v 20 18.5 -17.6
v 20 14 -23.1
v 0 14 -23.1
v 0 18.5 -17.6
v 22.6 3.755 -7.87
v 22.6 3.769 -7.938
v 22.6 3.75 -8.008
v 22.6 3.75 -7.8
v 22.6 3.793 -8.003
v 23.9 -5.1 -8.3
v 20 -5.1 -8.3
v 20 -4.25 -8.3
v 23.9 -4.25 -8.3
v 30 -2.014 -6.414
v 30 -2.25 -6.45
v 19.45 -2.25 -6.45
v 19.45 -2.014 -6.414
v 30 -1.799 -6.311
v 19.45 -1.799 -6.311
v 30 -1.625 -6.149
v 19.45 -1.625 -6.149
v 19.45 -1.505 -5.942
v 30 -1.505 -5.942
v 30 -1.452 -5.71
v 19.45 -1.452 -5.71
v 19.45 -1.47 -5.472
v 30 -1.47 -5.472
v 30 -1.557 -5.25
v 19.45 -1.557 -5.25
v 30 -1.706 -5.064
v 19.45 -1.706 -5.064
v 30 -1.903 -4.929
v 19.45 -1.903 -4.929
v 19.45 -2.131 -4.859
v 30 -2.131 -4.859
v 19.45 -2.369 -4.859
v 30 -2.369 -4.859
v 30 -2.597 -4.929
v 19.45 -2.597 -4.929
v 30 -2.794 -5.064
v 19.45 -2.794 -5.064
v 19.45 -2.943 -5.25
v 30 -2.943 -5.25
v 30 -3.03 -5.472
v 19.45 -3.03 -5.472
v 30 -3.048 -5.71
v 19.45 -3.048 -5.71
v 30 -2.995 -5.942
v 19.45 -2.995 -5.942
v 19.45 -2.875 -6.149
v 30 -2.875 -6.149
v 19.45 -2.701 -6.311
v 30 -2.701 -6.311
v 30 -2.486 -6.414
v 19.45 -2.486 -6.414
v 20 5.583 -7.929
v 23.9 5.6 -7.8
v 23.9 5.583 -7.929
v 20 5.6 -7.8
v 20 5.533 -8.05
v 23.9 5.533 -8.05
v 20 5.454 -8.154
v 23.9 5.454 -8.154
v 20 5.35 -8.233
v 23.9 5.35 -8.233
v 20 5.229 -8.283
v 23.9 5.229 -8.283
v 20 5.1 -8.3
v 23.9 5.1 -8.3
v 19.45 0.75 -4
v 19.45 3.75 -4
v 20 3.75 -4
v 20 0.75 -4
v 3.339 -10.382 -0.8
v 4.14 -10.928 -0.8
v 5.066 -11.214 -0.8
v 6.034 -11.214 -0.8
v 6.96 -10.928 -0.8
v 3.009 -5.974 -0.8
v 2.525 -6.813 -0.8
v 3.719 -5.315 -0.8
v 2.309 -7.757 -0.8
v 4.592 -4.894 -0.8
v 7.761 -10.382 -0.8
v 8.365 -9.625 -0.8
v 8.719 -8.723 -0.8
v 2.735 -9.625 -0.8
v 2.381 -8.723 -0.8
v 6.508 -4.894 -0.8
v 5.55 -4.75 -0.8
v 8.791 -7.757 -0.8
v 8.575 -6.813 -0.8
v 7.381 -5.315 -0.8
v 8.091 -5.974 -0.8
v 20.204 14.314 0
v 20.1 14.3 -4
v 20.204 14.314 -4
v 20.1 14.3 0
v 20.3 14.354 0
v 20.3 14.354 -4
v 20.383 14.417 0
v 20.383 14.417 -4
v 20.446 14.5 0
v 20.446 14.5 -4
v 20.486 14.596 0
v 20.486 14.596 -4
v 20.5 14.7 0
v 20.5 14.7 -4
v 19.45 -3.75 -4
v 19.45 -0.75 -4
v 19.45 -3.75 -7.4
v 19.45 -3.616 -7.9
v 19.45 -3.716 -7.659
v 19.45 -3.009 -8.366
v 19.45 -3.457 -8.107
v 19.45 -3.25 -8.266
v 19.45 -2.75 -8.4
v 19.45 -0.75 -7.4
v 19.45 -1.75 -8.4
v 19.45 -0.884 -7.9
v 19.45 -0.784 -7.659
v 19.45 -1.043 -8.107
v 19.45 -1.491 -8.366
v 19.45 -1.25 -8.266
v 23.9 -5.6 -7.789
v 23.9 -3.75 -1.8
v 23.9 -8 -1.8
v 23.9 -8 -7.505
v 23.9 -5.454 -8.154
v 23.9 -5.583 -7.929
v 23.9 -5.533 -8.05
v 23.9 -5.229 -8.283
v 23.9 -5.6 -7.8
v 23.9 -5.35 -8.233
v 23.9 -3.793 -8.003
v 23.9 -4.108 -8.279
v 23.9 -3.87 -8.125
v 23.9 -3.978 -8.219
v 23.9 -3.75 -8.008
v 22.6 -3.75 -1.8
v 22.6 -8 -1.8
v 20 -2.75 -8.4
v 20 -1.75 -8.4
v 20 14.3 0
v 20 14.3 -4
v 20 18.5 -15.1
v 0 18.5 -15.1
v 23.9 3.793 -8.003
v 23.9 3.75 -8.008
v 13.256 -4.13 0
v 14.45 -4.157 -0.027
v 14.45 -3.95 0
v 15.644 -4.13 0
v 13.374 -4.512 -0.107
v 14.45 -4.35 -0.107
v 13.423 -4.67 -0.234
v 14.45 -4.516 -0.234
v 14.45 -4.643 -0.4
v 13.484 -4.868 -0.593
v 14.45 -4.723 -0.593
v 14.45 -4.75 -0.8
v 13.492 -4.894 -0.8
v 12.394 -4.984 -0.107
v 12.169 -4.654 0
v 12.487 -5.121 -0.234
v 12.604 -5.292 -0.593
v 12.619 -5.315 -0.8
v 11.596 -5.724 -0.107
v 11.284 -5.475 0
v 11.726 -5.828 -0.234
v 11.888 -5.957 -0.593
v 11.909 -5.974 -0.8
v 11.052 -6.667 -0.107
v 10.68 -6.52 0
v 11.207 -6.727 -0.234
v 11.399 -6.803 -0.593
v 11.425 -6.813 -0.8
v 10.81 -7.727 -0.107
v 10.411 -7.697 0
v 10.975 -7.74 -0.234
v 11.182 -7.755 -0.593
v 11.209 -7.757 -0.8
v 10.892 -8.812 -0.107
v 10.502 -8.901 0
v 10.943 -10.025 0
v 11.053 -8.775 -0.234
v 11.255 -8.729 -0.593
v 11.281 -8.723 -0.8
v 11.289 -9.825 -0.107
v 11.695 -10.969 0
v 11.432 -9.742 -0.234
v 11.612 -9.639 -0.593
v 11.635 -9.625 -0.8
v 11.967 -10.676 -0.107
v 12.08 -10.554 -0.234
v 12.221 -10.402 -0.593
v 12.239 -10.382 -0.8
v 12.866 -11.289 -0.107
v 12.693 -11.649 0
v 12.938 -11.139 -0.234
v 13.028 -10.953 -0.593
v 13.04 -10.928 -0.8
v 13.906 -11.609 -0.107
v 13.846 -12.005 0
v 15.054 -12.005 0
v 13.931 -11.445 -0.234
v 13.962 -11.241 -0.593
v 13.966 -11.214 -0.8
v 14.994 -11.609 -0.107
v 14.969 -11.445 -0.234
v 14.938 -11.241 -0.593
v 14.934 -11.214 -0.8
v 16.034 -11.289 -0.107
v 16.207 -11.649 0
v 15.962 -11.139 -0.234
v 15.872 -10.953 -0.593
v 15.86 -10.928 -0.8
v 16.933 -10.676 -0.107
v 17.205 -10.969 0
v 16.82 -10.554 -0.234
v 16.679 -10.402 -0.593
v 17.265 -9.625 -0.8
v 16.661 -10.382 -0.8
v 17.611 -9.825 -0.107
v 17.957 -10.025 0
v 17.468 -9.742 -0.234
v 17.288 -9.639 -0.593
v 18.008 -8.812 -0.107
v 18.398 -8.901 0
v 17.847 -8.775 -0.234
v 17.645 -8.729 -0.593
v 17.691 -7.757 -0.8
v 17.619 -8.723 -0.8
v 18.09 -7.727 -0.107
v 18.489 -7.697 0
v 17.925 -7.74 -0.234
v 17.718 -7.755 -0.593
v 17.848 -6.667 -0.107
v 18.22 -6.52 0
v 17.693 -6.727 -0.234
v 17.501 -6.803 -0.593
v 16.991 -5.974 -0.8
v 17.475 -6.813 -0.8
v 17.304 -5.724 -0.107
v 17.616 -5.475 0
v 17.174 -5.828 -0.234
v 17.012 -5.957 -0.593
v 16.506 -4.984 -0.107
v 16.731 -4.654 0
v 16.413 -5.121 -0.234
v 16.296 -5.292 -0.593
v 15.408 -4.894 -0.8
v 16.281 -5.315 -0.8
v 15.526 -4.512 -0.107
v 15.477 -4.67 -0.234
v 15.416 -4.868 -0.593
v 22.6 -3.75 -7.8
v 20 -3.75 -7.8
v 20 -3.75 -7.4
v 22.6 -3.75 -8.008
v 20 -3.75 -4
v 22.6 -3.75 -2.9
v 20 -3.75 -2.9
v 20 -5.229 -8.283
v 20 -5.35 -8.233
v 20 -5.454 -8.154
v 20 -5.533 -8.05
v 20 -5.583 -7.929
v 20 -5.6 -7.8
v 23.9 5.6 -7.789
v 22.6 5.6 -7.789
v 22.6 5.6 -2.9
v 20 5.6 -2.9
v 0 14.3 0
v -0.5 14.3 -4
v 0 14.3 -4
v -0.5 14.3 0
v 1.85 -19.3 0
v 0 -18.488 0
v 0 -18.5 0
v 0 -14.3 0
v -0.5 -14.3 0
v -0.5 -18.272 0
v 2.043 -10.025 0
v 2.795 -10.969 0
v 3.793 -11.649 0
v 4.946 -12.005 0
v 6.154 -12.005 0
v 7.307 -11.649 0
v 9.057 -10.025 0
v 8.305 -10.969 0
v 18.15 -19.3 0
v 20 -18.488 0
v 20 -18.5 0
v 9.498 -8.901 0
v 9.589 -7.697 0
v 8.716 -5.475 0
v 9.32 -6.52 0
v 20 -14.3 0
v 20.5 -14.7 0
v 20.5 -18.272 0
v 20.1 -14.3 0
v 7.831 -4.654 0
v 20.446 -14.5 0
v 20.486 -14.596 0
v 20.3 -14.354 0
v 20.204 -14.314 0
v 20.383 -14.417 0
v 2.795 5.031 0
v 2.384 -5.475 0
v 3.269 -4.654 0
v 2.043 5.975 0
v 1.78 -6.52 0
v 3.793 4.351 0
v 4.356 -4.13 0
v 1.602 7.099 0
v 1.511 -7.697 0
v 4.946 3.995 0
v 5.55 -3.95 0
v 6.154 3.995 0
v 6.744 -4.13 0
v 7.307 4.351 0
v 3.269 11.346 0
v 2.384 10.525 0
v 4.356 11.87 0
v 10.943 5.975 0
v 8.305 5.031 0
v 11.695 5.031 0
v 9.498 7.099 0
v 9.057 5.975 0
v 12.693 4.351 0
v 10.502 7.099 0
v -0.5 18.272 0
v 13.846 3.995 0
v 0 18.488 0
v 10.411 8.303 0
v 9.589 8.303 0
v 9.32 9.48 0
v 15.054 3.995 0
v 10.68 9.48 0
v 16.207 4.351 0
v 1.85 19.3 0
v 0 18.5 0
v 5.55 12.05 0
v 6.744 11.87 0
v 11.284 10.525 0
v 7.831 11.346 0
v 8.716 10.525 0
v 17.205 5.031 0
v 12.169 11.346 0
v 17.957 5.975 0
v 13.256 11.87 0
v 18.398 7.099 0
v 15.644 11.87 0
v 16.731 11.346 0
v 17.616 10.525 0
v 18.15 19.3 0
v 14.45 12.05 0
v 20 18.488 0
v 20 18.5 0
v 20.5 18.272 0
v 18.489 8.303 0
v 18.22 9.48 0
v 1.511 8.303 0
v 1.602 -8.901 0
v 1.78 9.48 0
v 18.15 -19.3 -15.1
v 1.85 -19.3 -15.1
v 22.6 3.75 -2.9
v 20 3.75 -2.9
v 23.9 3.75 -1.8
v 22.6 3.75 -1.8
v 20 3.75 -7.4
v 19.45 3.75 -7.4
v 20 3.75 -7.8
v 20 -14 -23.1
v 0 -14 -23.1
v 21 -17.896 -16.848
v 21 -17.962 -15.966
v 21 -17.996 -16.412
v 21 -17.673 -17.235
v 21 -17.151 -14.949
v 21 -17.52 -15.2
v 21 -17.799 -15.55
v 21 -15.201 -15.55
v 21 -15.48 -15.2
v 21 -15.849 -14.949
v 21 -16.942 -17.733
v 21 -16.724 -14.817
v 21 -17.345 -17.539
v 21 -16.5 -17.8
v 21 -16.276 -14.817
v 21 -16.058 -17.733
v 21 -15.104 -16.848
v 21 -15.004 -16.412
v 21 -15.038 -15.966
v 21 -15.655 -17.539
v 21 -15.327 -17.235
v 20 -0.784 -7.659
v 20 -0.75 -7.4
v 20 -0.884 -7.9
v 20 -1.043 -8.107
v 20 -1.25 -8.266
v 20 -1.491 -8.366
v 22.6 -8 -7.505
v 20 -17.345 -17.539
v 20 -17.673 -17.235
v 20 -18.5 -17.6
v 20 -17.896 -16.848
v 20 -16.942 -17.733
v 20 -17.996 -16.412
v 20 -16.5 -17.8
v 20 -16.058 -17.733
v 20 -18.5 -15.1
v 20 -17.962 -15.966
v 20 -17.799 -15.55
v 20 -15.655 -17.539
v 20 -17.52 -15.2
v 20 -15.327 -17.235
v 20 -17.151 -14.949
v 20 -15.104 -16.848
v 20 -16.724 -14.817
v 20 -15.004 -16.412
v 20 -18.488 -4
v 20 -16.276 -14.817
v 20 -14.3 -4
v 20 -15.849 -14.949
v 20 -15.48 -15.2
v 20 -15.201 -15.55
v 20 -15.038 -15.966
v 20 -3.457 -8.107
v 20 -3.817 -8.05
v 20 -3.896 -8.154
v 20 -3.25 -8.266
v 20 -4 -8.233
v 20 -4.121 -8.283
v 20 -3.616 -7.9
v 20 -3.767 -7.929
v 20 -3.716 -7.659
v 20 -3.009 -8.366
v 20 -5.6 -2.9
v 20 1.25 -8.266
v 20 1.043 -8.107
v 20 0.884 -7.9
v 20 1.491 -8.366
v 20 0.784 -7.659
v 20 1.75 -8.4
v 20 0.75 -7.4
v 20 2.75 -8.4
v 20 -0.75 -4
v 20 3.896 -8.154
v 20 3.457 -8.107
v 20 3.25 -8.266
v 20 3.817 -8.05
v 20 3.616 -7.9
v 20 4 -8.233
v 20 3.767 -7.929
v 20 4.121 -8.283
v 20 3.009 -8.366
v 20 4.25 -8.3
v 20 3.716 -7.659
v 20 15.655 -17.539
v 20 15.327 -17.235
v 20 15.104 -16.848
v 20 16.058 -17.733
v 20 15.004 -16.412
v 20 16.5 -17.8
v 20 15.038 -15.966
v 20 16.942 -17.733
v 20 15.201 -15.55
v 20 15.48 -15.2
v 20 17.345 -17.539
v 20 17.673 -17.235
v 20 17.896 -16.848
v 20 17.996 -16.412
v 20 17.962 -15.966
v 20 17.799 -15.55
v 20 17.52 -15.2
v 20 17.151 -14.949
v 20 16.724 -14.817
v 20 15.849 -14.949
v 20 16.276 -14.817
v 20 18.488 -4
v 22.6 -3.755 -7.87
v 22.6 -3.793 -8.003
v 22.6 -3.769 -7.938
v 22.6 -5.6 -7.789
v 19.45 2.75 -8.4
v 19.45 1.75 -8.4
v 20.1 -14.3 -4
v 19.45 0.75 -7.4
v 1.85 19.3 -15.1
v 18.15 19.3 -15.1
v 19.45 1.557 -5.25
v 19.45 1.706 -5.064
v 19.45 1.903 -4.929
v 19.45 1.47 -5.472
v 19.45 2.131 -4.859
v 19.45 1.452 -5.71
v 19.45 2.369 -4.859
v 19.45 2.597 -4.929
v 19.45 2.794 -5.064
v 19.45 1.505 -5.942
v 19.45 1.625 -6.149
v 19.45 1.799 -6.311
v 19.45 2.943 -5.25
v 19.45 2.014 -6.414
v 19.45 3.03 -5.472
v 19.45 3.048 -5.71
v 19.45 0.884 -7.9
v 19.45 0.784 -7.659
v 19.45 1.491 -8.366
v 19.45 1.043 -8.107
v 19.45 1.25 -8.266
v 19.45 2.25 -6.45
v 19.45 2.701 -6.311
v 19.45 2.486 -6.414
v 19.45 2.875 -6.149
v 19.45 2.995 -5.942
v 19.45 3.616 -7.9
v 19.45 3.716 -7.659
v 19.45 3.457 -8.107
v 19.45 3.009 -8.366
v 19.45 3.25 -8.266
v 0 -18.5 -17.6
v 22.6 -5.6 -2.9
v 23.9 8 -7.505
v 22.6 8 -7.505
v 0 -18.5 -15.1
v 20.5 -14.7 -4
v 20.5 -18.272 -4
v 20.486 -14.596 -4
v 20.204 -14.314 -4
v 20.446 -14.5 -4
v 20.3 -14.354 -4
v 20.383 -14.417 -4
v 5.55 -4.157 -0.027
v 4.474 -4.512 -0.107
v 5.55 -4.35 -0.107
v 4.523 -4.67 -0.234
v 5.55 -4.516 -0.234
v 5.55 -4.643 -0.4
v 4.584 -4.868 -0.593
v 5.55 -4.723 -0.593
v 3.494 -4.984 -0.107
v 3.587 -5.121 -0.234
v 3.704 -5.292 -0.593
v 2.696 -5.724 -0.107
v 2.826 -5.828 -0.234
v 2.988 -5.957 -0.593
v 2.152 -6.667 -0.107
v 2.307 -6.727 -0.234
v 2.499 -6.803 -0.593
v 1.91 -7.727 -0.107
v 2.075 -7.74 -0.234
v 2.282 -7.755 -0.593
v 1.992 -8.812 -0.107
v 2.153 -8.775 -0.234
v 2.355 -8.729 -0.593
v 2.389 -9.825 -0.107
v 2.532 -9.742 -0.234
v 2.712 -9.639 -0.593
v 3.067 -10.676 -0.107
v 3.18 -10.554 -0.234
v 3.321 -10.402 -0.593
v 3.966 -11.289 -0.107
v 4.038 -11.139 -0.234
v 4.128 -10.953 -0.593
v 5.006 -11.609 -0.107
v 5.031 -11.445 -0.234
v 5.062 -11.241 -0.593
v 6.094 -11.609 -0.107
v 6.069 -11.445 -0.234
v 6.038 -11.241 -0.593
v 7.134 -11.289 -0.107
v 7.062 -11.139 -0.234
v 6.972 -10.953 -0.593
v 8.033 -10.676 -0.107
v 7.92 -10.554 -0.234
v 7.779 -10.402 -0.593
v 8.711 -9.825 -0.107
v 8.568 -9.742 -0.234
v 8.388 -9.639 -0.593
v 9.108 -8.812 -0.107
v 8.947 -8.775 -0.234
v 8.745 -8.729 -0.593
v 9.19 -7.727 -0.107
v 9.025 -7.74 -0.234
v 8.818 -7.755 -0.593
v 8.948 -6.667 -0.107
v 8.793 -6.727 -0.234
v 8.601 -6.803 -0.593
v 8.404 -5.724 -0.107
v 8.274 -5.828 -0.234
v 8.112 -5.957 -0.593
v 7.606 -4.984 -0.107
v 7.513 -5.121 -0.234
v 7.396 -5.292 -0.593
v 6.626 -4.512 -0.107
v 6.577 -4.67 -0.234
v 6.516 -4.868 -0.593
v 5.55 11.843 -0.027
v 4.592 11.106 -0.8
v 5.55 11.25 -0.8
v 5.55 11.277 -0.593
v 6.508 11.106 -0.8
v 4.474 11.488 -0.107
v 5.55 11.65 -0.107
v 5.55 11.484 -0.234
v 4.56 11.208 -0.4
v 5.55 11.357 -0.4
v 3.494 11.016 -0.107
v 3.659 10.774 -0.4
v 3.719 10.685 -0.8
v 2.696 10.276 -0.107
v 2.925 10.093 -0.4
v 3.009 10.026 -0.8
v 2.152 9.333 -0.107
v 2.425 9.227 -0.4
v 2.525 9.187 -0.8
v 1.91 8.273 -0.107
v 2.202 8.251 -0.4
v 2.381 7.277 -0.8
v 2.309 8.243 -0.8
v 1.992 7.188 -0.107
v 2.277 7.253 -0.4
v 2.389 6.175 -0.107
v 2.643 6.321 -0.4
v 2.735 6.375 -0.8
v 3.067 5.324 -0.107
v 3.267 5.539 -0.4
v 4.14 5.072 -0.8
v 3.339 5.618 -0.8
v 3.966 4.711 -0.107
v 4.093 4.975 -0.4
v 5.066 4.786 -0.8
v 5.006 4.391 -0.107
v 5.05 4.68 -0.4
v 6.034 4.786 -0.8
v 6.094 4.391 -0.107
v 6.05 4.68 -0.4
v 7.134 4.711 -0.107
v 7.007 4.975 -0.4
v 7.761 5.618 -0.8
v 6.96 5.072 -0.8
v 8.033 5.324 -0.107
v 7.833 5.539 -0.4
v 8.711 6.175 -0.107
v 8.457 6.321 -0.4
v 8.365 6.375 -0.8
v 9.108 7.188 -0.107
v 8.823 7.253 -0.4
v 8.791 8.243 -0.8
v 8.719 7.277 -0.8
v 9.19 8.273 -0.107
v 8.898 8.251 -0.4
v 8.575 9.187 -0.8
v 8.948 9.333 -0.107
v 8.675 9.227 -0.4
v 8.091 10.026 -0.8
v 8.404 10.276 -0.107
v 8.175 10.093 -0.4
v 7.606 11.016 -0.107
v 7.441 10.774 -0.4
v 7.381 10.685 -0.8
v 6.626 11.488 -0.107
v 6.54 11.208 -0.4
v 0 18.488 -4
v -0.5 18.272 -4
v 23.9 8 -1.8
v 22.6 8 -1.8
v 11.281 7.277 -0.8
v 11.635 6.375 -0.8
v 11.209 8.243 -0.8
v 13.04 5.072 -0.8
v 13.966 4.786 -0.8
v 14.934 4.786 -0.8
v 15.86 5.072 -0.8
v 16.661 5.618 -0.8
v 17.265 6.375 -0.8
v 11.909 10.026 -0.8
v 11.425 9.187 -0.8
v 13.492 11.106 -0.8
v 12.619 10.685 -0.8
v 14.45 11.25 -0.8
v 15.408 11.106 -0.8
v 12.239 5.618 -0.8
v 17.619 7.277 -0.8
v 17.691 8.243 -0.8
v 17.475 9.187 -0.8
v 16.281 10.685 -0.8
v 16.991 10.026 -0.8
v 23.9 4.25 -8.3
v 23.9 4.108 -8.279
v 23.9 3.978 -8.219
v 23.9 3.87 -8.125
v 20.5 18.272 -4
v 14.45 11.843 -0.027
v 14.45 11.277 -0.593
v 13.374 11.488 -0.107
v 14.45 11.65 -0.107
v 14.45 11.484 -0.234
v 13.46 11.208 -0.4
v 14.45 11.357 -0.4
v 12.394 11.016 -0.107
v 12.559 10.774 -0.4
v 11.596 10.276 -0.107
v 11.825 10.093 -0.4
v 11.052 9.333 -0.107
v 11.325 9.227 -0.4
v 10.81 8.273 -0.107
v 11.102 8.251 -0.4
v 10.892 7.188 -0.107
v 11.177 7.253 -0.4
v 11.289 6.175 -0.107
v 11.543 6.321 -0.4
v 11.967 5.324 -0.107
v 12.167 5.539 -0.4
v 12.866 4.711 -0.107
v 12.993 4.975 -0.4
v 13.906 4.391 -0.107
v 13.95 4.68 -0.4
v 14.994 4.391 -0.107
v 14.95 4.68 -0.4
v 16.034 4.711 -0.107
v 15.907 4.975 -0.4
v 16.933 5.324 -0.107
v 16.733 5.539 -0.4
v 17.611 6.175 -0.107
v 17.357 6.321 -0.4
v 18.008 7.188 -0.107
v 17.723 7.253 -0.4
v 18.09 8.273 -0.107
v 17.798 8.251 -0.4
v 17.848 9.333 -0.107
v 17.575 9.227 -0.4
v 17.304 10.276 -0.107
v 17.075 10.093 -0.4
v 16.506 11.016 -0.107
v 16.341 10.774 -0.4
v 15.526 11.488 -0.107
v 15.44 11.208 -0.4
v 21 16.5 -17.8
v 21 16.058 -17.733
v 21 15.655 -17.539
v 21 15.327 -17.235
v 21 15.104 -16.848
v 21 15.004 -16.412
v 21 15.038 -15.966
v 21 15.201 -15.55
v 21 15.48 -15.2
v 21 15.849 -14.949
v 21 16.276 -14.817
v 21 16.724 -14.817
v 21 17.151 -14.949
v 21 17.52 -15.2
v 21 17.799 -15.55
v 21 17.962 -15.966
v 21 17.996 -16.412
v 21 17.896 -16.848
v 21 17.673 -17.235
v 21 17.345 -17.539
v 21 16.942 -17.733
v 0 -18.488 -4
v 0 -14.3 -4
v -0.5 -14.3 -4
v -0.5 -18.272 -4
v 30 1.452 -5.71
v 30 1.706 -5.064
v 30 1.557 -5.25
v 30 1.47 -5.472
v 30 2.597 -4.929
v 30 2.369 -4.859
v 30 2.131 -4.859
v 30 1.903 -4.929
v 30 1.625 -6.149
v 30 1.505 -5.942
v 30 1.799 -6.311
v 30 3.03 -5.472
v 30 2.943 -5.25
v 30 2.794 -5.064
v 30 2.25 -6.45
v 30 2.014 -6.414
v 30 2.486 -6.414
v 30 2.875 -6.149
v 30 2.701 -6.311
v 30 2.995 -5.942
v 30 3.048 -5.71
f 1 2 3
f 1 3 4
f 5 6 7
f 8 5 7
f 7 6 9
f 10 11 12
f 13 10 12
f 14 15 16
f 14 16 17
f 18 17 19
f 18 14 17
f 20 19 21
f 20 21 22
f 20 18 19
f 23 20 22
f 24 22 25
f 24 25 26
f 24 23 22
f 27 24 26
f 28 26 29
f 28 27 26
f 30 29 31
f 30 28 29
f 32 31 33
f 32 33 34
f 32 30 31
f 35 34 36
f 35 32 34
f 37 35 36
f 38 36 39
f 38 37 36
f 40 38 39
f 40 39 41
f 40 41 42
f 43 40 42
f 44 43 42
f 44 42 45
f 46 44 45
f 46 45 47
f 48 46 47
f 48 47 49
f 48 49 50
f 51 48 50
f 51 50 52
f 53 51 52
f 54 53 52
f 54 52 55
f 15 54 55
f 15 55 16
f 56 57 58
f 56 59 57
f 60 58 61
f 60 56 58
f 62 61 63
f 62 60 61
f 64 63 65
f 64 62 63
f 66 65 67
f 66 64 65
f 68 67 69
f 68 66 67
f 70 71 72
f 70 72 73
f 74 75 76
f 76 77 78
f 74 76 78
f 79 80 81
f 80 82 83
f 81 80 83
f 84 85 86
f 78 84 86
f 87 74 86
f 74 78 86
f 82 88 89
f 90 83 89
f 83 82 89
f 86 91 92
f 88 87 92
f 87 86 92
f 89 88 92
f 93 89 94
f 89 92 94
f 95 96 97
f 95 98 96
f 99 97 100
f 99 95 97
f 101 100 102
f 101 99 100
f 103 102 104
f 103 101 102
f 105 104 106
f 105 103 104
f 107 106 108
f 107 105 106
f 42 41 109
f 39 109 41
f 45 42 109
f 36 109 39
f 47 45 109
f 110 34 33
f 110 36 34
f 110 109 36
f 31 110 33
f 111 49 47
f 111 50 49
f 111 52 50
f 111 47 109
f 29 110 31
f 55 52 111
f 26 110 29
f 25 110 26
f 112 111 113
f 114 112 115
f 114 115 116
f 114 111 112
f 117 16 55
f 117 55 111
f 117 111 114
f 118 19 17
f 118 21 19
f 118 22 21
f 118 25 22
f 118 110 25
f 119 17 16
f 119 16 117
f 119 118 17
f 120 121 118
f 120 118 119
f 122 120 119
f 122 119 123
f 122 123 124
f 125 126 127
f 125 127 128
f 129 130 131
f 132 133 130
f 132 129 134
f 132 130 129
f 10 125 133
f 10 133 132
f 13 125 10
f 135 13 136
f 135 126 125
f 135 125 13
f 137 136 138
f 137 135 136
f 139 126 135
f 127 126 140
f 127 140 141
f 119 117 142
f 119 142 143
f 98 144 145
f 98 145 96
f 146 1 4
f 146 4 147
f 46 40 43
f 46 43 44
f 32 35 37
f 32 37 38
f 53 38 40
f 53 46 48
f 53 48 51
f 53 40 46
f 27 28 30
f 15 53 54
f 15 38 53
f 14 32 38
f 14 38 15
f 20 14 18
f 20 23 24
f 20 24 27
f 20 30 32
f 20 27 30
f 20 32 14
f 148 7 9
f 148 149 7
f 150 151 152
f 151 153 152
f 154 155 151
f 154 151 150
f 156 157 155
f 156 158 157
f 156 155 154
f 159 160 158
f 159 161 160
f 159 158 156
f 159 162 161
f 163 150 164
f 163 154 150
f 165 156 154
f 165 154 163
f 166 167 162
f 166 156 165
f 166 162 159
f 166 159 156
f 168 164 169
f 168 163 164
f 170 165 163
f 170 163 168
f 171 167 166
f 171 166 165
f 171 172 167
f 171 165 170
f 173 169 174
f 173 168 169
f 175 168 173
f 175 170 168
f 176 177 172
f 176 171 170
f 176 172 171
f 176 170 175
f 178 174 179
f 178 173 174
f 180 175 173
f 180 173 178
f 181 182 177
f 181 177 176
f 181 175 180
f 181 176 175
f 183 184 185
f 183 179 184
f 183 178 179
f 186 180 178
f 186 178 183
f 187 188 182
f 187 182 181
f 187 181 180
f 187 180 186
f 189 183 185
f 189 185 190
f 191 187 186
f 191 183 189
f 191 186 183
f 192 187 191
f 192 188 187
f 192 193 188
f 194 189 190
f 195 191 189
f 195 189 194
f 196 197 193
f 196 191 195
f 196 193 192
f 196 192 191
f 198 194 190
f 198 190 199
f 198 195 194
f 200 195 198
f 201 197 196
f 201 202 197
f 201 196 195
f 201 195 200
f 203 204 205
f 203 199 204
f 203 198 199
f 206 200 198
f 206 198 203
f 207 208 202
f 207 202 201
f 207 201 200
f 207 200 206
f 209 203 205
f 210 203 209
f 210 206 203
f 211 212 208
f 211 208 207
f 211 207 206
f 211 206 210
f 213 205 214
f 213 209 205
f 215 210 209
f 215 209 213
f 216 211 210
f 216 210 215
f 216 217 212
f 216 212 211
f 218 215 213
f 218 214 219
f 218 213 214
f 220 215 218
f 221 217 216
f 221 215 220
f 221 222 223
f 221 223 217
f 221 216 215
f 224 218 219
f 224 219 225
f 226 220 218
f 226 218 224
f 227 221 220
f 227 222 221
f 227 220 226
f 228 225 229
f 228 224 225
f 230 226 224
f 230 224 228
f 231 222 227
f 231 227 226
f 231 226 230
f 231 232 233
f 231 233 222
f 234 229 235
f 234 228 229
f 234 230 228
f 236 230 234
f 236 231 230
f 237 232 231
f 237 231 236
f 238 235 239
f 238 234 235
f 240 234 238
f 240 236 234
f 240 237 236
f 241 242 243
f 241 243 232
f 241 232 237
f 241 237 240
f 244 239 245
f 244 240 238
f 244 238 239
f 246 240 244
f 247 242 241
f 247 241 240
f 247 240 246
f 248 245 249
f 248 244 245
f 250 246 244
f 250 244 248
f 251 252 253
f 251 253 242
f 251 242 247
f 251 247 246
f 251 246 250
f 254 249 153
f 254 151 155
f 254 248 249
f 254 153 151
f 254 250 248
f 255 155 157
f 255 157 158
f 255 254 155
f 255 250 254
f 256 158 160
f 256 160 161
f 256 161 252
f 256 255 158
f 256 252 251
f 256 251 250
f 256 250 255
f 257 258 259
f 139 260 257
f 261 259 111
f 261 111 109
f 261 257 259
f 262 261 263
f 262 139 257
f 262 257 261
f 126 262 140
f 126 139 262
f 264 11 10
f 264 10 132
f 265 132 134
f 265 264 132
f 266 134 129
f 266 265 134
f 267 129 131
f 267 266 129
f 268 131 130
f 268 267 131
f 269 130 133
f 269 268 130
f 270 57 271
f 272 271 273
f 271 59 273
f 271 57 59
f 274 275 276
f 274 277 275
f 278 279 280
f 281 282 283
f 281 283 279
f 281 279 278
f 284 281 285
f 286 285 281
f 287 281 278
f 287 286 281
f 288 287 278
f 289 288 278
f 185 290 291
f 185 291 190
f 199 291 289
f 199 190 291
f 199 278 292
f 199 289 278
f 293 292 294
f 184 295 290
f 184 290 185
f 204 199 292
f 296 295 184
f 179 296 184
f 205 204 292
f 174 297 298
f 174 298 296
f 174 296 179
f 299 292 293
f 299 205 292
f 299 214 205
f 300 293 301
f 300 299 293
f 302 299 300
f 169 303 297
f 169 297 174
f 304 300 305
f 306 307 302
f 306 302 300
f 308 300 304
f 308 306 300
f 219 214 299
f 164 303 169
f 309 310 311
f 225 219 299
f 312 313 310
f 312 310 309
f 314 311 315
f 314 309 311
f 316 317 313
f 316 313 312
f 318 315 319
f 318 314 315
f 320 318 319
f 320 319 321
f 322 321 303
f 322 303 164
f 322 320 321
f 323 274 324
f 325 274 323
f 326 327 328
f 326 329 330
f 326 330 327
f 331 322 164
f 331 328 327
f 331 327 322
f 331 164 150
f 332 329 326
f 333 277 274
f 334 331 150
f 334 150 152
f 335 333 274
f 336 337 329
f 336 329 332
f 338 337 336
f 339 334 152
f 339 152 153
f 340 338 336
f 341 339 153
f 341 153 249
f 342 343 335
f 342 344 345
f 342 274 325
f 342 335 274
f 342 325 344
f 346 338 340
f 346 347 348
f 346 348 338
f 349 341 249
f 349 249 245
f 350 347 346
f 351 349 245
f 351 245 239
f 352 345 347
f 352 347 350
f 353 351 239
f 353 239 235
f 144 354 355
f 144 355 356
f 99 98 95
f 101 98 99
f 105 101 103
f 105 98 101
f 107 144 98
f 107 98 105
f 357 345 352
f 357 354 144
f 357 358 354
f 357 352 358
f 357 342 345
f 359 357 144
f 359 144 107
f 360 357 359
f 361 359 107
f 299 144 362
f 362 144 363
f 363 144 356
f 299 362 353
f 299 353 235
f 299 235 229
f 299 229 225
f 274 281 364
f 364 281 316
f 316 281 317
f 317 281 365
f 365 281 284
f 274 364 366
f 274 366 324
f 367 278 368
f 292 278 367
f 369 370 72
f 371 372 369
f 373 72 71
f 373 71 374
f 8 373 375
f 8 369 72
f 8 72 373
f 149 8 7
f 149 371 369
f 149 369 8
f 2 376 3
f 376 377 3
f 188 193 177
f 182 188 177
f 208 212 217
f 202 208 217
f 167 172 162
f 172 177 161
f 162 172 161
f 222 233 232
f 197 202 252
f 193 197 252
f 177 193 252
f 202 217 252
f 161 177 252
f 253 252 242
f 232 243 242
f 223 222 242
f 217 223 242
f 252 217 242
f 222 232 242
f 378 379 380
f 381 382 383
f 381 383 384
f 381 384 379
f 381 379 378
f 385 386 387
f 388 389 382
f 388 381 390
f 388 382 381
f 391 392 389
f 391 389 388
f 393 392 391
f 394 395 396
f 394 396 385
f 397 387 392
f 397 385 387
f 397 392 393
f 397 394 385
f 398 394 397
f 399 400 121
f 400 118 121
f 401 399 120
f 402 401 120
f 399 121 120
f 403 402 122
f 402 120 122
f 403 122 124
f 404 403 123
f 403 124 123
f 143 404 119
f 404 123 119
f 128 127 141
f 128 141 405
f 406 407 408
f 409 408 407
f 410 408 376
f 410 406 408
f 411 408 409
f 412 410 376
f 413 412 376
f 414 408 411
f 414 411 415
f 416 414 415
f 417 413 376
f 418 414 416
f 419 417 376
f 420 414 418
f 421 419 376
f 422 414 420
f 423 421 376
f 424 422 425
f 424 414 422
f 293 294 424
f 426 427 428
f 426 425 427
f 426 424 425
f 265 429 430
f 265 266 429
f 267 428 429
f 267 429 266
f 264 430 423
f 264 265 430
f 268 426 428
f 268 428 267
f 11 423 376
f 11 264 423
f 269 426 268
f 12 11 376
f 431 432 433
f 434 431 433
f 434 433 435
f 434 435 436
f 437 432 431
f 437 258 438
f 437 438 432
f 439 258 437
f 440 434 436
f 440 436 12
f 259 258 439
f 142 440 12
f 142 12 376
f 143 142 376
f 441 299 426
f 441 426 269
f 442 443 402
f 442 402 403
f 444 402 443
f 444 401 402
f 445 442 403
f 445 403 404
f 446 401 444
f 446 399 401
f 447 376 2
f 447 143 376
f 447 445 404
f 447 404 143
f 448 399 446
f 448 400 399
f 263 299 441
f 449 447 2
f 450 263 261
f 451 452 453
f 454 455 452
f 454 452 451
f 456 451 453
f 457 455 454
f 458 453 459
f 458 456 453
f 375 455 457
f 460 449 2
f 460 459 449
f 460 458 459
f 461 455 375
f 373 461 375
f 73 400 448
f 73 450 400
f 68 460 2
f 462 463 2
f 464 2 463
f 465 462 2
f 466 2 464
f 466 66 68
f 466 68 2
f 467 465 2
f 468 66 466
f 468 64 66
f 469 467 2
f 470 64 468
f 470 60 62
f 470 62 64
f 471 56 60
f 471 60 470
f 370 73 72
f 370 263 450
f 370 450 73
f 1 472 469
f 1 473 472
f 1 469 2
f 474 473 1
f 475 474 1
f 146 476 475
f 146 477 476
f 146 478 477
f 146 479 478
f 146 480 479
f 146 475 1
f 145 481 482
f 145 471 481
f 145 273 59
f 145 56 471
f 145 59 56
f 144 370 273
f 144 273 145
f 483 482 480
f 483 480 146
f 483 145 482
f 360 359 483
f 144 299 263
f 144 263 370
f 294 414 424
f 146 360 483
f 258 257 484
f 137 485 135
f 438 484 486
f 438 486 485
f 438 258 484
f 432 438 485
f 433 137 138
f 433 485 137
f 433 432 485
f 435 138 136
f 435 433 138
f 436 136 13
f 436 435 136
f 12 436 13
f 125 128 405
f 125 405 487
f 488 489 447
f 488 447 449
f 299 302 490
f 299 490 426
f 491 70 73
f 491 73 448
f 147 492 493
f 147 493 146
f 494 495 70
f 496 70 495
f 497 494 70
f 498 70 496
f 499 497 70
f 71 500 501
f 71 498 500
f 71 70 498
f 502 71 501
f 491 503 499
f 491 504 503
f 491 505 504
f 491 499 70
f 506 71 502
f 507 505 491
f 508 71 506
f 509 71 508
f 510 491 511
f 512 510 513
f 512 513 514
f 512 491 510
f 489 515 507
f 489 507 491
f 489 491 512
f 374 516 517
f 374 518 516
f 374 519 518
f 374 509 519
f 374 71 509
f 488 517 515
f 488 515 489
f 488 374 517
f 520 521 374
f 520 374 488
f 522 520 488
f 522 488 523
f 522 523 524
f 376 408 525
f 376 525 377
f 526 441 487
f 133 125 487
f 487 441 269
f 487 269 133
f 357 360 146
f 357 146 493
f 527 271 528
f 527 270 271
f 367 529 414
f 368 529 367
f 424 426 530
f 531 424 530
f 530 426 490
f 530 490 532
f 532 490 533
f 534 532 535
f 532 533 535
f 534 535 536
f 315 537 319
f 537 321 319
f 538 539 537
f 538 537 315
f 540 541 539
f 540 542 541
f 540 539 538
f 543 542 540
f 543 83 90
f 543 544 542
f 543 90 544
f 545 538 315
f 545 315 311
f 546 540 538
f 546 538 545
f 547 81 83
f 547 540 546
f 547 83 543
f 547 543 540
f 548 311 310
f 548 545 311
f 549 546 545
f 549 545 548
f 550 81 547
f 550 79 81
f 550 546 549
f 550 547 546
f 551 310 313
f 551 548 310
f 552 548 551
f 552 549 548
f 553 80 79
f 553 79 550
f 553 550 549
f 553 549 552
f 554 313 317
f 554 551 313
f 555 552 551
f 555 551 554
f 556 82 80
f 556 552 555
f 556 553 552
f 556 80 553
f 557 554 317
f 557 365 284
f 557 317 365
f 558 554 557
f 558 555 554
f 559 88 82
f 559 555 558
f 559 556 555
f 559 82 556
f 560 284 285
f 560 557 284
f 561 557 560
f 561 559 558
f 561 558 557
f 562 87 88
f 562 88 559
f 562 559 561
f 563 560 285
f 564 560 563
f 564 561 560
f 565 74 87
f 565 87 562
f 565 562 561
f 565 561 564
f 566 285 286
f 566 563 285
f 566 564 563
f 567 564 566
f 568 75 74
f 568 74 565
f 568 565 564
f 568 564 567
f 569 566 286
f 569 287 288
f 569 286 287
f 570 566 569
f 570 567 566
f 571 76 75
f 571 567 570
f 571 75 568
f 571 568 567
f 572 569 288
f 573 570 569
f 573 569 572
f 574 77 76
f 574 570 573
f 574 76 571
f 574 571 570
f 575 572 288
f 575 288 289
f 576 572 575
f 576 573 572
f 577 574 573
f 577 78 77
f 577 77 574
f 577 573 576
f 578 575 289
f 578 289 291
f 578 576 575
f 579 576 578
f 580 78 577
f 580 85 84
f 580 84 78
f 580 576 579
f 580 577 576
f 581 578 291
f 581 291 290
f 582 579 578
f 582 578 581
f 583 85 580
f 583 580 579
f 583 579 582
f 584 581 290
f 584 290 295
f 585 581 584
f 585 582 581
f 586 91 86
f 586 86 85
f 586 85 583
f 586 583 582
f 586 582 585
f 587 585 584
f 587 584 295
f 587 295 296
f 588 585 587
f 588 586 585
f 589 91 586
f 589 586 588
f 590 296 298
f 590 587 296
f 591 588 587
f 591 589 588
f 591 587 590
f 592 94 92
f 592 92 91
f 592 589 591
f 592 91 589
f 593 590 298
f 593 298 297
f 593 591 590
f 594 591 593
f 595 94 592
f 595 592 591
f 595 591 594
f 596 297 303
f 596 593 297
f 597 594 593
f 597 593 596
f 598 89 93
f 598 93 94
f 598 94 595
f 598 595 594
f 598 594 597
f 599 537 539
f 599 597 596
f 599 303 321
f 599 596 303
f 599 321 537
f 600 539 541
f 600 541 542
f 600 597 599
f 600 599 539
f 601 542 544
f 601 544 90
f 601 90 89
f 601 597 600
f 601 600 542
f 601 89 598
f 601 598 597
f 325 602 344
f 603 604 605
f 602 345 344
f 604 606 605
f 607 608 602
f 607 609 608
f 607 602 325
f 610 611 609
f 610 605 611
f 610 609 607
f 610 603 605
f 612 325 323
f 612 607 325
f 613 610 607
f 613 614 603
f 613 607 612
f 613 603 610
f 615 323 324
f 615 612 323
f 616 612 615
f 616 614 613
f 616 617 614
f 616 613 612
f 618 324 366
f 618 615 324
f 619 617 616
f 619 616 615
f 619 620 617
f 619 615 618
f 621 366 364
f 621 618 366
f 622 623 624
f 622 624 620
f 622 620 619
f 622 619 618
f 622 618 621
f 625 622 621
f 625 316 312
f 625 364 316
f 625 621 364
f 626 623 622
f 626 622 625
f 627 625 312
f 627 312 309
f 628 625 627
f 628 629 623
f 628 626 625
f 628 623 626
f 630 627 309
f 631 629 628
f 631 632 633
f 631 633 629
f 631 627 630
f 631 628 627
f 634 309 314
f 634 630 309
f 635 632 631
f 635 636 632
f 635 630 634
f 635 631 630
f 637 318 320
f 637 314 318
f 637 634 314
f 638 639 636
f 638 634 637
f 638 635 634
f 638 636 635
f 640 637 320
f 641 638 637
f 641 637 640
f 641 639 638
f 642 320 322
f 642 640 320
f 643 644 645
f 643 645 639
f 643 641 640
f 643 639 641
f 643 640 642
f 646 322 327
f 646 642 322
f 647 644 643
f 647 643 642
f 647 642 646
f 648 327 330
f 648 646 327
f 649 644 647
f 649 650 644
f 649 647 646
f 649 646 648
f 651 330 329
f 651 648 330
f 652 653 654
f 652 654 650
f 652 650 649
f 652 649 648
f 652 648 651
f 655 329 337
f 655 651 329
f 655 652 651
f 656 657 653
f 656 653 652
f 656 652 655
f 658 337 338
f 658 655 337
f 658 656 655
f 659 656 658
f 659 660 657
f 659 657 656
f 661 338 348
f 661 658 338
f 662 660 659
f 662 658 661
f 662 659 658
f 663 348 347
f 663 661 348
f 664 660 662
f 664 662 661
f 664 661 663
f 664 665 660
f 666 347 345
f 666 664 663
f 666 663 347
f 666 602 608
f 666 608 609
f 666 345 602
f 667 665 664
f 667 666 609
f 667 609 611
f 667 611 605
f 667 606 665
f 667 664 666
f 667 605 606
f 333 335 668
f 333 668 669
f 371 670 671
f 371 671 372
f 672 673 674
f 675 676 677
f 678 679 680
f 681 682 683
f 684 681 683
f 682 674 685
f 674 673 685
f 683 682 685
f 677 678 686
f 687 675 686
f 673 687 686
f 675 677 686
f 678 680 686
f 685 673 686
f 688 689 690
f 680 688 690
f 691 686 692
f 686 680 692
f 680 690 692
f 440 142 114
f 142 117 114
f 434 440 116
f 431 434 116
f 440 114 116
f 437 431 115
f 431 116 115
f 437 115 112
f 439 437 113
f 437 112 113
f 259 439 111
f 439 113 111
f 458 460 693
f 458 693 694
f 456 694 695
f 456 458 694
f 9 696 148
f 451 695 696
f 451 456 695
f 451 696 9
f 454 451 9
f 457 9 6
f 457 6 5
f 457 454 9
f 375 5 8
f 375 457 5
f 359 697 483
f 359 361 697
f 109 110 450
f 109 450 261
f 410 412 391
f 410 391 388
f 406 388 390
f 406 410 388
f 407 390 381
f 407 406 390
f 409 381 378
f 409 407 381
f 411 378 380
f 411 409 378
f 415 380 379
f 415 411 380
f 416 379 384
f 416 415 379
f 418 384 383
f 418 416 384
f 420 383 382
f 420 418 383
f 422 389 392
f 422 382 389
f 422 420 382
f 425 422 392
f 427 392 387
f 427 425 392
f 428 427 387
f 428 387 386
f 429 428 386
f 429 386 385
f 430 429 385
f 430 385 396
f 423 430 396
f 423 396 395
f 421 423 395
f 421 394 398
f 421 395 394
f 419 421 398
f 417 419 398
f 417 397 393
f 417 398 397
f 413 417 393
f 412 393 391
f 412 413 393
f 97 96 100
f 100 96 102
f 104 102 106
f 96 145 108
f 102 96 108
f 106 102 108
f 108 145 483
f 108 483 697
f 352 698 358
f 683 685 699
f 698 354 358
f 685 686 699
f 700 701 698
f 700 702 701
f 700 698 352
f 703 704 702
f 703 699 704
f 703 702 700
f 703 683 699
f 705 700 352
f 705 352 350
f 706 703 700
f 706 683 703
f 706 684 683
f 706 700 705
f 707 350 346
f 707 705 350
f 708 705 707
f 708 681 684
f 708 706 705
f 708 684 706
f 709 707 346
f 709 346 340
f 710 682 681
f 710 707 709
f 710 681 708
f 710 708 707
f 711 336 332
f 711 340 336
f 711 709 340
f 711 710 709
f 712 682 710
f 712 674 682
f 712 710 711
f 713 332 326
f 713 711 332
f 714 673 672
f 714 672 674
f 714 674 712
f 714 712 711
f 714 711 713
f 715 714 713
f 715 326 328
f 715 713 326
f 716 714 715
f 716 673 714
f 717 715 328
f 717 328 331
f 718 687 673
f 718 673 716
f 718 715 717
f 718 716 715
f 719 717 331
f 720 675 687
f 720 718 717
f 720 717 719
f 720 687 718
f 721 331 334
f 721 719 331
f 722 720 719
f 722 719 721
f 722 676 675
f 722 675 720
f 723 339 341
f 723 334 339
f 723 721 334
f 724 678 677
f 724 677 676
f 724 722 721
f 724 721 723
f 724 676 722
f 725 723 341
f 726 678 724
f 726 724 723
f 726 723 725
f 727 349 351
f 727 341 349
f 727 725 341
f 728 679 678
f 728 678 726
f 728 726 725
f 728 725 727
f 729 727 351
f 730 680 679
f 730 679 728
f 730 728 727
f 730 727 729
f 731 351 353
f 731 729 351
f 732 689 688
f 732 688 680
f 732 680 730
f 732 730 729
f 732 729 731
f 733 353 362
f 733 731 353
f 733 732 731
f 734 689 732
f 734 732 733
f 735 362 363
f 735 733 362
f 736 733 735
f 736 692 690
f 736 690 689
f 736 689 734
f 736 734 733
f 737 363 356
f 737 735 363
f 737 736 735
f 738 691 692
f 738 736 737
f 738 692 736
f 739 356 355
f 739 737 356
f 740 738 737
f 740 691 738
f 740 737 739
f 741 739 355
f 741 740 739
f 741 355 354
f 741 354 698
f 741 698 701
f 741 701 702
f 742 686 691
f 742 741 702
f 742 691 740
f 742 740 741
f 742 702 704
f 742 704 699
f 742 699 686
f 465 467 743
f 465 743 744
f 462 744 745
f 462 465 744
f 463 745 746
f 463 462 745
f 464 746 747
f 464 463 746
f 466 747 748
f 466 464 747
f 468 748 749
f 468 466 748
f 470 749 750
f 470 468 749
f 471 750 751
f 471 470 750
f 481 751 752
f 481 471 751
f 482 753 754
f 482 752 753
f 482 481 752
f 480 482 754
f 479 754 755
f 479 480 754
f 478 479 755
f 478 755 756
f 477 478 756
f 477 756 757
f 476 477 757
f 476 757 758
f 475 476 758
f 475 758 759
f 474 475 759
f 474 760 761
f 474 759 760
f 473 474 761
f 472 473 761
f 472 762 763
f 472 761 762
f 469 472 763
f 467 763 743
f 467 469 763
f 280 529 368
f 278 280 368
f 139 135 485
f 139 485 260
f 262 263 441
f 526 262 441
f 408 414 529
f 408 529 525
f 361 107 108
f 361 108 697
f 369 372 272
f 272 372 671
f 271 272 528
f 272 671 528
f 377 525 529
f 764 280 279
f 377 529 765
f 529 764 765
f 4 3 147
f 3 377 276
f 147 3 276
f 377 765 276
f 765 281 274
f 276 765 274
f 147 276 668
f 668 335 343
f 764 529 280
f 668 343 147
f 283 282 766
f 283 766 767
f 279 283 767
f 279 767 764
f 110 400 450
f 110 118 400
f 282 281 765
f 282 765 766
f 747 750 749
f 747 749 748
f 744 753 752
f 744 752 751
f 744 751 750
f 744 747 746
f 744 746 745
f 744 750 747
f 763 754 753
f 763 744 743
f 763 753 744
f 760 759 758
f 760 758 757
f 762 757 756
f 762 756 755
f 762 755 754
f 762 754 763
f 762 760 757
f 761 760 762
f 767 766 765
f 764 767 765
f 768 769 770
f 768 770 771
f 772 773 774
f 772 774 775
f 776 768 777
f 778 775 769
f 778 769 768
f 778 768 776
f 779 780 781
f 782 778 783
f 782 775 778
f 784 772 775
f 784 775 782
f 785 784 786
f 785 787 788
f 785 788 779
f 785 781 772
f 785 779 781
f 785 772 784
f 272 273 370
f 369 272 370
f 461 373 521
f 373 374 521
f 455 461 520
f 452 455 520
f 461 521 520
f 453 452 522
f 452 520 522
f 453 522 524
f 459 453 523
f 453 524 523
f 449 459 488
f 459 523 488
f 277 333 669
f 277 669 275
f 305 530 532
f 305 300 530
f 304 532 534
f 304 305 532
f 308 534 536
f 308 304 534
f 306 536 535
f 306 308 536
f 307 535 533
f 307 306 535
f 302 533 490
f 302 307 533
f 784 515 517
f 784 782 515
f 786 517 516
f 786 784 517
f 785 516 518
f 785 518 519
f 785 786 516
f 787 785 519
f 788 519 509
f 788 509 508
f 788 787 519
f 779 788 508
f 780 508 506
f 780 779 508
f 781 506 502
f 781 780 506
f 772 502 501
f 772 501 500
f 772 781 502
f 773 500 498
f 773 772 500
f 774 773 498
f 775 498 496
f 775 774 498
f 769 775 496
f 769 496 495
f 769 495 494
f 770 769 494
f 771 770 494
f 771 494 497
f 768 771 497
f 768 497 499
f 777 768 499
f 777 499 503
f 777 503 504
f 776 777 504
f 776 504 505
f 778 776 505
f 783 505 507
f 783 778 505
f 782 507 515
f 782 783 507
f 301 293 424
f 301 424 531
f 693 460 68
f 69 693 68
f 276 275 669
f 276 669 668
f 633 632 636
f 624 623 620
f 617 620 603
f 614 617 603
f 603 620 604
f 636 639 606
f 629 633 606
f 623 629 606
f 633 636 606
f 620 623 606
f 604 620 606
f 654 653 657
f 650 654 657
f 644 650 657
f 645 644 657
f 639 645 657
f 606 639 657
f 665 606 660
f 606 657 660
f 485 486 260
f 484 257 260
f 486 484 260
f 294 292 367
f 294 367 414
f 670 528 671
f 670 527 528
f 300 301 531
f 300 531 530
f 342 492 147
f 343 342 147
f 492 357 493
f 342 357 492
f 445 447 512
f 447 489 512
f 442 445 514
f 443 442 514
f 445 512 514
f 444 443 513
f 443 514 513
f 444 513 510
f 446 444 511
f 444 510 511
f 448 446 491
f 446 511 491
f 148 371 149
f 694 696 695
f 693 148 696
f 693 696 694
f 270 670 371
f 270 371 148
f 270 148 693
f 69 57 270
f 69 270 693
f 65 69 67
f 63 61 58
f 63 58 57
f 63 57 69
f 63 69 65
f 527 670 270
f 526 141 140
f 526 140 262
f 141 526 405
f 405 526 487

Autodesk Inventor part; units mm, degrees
sketch "Sketch_1" plane through (0, 0, 0) normal (1, 0, 0) x (0, 1, 0)
  line L0 (-18.5, 0) -> (-18.5, -17.6)
  line L1 (-18.5, -17.6) -> (-14, -23.1)
  line L2 (-14, -23.1) -> (14, -23.1)
  line L3 (14, -23.1) -> (18.5, -17.6)
  line L4 (18.5, -17.6) -> (18.5, 0)
  line L5 (18.5, 0) -> (-18.5, 0)
extrude "Extrusion1" add sketch "Sketch_1" along normal blind 20
sketch "Sketch_2" plane through (0, 0, 0) normal (0, 0, 1) x (1, 0, 0)
  line L0 (0, 18.5) -> (20, 18.5)
  line L1 (20, 18.5) -> (18.15, 19.3)
  line L2 (18.15, 19.3) -> (1.85, 19.3)
  line L3 (1.85, 19.3) -> (0, 18.5)
extrude "Extrusion2" add sketch "Sketch_2" against normal blind 15.1
sketch "Sketch_3" plane through (0, 0, 0) normal (0, 0, 1) x (1, 0, 0)
  line L0 (0, -18.5) -> (1.85, -19.3)
  line L1 (1.85, -19.3) -> (18.15, -19.3)
  line L2 (18.15, -19.3) -> (20, -18.5)
  line L3 (20, -18.5) -> (0, -18.5)
extrude "Extrusion3" add sketch "Sketch_3" against normal blind 15.1
sketch "Sketch_4" plane through (0, 0, 0) normal (0, 0, 1) x (1, 0, 0)
  line L0 (-0.5, 18.272) -> (-0.5, 14.3)
  line L1 (-0.5, 14.3) -> (0.5, 14.3)
  line L2 (0.5, 14.3) -> (0.5, 18.7044)
  line L3 (0.5, 18.7044) -> (-0.5, 18.272)
extrude "Extrusion4" add sketch "Sketch_4" against normal blind 4
sketch "Sketch_5" plane through (0, 0, 0) normal (0, 0, 1) x (1, 0, 0)
  line L0 (19.5, 18.7044) -> (19.5, 14.3)
  line L1 (19.5, 14.3) -> (20.1, 14.3)
  arc A0 (20.1, 14.3) -> (20.5, 14.7) centre (20.1, 14.7) ccw
  line L2 (20.5, 14.7) -> (20.5, 18.272)
  line L3 (20.5, 18.272) -> (19.5, 18.7044)
extrude "Extrusion5" add sketch "Sketch_5" against normal blind 4
sketch "Sketch_6" plane through (0, 0, 0) normal (0, 0, 1) x (1, 0, 0)
  line L0 (-0.5, -18.272) -> (0.5, -18.7044)
  line L1 (0.5, -18.7044) -> (0.5, -14.3)
  line L2 (0.5, -14.3) -> (-0.5, -14.3)
  line L3 (-0.5, -14.3) -> (-0.5, -18.272)
extrude "Extrusion6" add sketch "Sketch_6" against normal blind 4
sketch "Sketch_7" plane through (0, 0, 0) normal (0, 0, 1) x (1, 0, 0)
  line L0 (19.5, -18.7044) -> (20.5, -18.272)
  line L1 (20.5, -18.272) -> (20.5, -14.7)
  arc A0 (20.5, -14.7) -> (20.1, -14.3) centre (20.1, -14.7) ccw
  line L2 (20.1, -14.3) -> (19.5, -14.3)
  line L3 (19.5, -14.3) -> (19.5, -18.7044)
extrude "Extrusion7" add sketch "Sketch_7" against normal blind 4
sketch "Sketch_8" plane through (20, 0, 0) normal (1, 0, 0) x (0, 0, -1)
  circle A0 centre (16.3, 16.5) radius 1.5
extrude "Extrusion8" add sketch "Sketch_8" along normal mid plane 2
sketch "Sketch_9" plane through (20, 0, 0) normal (1, 0, 0) x (0, 0, -1)
  circle A0 centre (16.3, -16.5) radius 1.5
extrude "Extrusion9" add sketch "Sketch_9" along normal mid plane 2
sketch "Sketch_10" plane through (5.55, 0, 0) normal (1, 0, 0) x (0, 0, -1)
  line L0 (0.8, 8) -> (-1.2, 8)
  line L1 (-1.2, 8) -> (-1.2, 12.05)
  line L2 (-1.2, 12.05) -> (0, 12.05)
  arc A0 (0, 12.05) -> (0.8, 11.25) centre (0.8, 12.05) ccw
  line L3 (0.8, 11.25) -> (0.8, 8)
  line L4 (0.8, 8) -> (-1.2, 8)
revolve "Revolution1" cut sketch "Sketch_10" angle 360 about axis through (5.55, 8, -0.8) along (0, 0, -1)
sketch "Sketch_11" plane through (14.45, 0, 0) normal (1, 0, 0) x (0, 0, -1)
  line L0 (0.8, 8) -> (-1.2, 8)
  line L1 (-1.2, 8) -> (-1.2, 12.05)
  line L2 (-1.2, 12.05) -> (0, 12.05)
  arc A0 (0, 12.05) -> (0.8, 11.25) centre (0.8, 12.05) ccw
  line L3 (0.8, 11.25) -> (0.8, 8)
  line L4 (0.8, 8) -> (-1.2, 8)
revolve "Revolution2" cut sketch "Sketch_11" angle 360 about axis through (14.45, 8, -0.8) along (0, 0, -1)
sketch "Sketch_12" plane through (5.55, 0, 0) normal (1, 0, 0) x (0, 0, -1)
  line L0 (0.8, -8) -> (-1.2, -8)
  line L1 (-1.2, -8) -> (-1.2, -3.95)
  line L2 (-1.2, -3.95) -> (0, -3.95)
  arc A0 (0, -3.95) -> (0.8, -4.75) centre (0.8, -3.95) ccw
  line L3 (0.8, -4.75) -> (0.8, -8)
  line L4 (0.8, -8) -> (-1.2, -8)
revolve "Revolution3" cut sketch "Sketch_12" angle 360 about axis through (5.55, -8, -0.8) along (0, 0, -1)
sketch "Sketch_13" plane through (14.45, 0, 0) normal (1, 0, 0) x (0, 0, -1)
  line L0 (0.8, -8) -> (-1.2, -8)
  line L1 (-1.2, -8) -> (-1.2, -3.95)
  line L2 (-1.2, -3.95) -> (0, -3.95)
  arc A0 (0, -3.95) -> (0.8, -4.75) centre (0.8, -3.95) ccw
  line L3 (0.8, -4.75) -> (0.8, -8)
  line L4 (0.8, -8) -> (-1.2, -8)
revolve "Revolution4" cut sketch "Sketch_13" angle 360 about axis through (14.45, -8, -0.8) along (0, 0, -1)
sketch "Sketch_14" plane through (20, 0, 0) normal (1, 0, 0) x (0, 0, -1)
  line L0 (2.9, 5.6) -> (2.9, 3.75)
  line L1 (2.9, 3.75) -> (7.8, 3.75)
  arc A0 (7.8, 3.75) -> (8.3, 4.25) centre (7.8, 4.25) ccw
  line L2 (8.3, 4.25) -> (8.3, 5.1)
  arc A1 (8.3, 5.1) -> (7.8, 5.6) centre (7.8, 5.1) ccw
  line L3 (7.8, 5.6) -> (2.9, 5.6)
extrude "Extrusion10" add sketch "Sketch_14" along normal mid plane 7.8
sketch "Sketch_15" plane through (20, 0, 0) normal (1, 0, 0) x (0, 0, -1)
  line L0 (2.9, -3.75) -> (2.9, -5.6)
  line L1 (2.9, -5.6) -> (7.8, -5.6)
  arc A0 (7.8, -5.6) -> (8.3, -5.1) centre (7.8, -5.1) ccw
  line L2 (8.3, -5.1) -> (8.3, -4.25)
  arc A1 (8.3, -4.25) -> (7.8, -3.75) centre (7.8, -4.25) ccw
  line L3 (7.8, -3.75) -> (2.9, -3.75)
extrude "Extrusion11" add sketch "Sketch_15" along normal mid plane 7.8
sketch "Sketch_16" plane through (23.9, 0, 0) normal (1, 0, 0) x (0, 0, -1)
  line L0 (1.8, 3.75) -> (8.0083, 3.75)
  line L1 (8.0083, 3.75) -> (7.5053, 8)
  line L2 (7.5053, 8) -> (1.8, 8)
  line L3 (1.8, 8) -> (1.8, 3.75)
extrude "Extrusion12" add sketch "Sketch_16" against normal blind 1.3
sketch "Sketch_17" plane through (23.9, 0, 0) normal (1, 0, 0) x (0, 0, -1)
  line L0 (1.8, -3.75) -> (1.8, -8)
  line L1 (1.8, -8) -> (7.5053, -8)
  line L2 (7.5053, -8) -> (8.0083, -3.75)
  line L3 (8.0083, -3.75) -> (1.8, -3.75)
extrude "Extrusion13" add sketch "Sketch_17" against normal blind 1.3
sketch "Sketch_19" plane through (20, 0, 0) normal (1, 0, 0) x (0, 0, -1)
  line L0 (4, 3.75) -> (4, 0.75)
  line L1 (4, 0.75) -> (7.4, 0.75)
  arc A0 (7.4, 0.75) -> (8.4, 1.75) centre (7.4, 1.75) ccw
  line L2 (8.4, 1.75) -> (8.4, 2.75)
  arc A1 (8.4, 2.75) -> (7.4, 3.75) centre (7.4, 2.75) ccw
  line L3 (7.4, 3.75) -> (4, 3.75)
extrude "Extrusion14" cut sketch "Sketch_19" along normal mid plane 1.1
sketch "Sketch_20" plane through (20, 0, 0) normal (1, 0, 0) x (0, 0, -1)
  line L0 (4, -0.75) -> (4, -3.75)
  line L1 (4, -3.75) -> (7.4, -3.75)
  arc A0 (7.4, -3.75) -> (8.4, -2.75) centre (7.4, -2.75) ccw
  line L2 (8.4, -2.75) -> (8.4, -1.75)
  arc A1 (8.4, -1.75) -> (7.4, -0.75) centre (7.4, -1.75) ccw
  line L3 (7.4, -0.75) -> (4, -0.75)
extrude "Extrusion15" cut sketch "Sketch_20" along normal mid plane 1.1
sketch "Sketch_21" plane through (20, 0, 0) normal (1, 0, 0) x (0, 0, -1)
  circle A0 centre (5.65, 2.25) radius 0.8
extrude "Extrusion16" add sketch "Sketch_21" along normal mid plane 20
sketch "Sketch_22" plane through (20, 0, 0) normal (1, 0, 0) x (0, 0, -1)
  circle A0 centre (5.65, -2.25) radius 0.8
extrude "Extrusion17" add sketch "Sketch_22" along normal mid plane 20
ref_plane "2p1_XY" through (0, 0, 0) normal (0, 0, -1) x (1, 0, 0)
ref_plane "2p1_YZ" through (0, 0, 0) normal (1, 0, 0) x (0, -1, 0)
ref_plane "2p1_ZX" through (0, 0, 0) normal (0, -1, 0) x (0, 0, -1)
properties part number "259434_part2"
